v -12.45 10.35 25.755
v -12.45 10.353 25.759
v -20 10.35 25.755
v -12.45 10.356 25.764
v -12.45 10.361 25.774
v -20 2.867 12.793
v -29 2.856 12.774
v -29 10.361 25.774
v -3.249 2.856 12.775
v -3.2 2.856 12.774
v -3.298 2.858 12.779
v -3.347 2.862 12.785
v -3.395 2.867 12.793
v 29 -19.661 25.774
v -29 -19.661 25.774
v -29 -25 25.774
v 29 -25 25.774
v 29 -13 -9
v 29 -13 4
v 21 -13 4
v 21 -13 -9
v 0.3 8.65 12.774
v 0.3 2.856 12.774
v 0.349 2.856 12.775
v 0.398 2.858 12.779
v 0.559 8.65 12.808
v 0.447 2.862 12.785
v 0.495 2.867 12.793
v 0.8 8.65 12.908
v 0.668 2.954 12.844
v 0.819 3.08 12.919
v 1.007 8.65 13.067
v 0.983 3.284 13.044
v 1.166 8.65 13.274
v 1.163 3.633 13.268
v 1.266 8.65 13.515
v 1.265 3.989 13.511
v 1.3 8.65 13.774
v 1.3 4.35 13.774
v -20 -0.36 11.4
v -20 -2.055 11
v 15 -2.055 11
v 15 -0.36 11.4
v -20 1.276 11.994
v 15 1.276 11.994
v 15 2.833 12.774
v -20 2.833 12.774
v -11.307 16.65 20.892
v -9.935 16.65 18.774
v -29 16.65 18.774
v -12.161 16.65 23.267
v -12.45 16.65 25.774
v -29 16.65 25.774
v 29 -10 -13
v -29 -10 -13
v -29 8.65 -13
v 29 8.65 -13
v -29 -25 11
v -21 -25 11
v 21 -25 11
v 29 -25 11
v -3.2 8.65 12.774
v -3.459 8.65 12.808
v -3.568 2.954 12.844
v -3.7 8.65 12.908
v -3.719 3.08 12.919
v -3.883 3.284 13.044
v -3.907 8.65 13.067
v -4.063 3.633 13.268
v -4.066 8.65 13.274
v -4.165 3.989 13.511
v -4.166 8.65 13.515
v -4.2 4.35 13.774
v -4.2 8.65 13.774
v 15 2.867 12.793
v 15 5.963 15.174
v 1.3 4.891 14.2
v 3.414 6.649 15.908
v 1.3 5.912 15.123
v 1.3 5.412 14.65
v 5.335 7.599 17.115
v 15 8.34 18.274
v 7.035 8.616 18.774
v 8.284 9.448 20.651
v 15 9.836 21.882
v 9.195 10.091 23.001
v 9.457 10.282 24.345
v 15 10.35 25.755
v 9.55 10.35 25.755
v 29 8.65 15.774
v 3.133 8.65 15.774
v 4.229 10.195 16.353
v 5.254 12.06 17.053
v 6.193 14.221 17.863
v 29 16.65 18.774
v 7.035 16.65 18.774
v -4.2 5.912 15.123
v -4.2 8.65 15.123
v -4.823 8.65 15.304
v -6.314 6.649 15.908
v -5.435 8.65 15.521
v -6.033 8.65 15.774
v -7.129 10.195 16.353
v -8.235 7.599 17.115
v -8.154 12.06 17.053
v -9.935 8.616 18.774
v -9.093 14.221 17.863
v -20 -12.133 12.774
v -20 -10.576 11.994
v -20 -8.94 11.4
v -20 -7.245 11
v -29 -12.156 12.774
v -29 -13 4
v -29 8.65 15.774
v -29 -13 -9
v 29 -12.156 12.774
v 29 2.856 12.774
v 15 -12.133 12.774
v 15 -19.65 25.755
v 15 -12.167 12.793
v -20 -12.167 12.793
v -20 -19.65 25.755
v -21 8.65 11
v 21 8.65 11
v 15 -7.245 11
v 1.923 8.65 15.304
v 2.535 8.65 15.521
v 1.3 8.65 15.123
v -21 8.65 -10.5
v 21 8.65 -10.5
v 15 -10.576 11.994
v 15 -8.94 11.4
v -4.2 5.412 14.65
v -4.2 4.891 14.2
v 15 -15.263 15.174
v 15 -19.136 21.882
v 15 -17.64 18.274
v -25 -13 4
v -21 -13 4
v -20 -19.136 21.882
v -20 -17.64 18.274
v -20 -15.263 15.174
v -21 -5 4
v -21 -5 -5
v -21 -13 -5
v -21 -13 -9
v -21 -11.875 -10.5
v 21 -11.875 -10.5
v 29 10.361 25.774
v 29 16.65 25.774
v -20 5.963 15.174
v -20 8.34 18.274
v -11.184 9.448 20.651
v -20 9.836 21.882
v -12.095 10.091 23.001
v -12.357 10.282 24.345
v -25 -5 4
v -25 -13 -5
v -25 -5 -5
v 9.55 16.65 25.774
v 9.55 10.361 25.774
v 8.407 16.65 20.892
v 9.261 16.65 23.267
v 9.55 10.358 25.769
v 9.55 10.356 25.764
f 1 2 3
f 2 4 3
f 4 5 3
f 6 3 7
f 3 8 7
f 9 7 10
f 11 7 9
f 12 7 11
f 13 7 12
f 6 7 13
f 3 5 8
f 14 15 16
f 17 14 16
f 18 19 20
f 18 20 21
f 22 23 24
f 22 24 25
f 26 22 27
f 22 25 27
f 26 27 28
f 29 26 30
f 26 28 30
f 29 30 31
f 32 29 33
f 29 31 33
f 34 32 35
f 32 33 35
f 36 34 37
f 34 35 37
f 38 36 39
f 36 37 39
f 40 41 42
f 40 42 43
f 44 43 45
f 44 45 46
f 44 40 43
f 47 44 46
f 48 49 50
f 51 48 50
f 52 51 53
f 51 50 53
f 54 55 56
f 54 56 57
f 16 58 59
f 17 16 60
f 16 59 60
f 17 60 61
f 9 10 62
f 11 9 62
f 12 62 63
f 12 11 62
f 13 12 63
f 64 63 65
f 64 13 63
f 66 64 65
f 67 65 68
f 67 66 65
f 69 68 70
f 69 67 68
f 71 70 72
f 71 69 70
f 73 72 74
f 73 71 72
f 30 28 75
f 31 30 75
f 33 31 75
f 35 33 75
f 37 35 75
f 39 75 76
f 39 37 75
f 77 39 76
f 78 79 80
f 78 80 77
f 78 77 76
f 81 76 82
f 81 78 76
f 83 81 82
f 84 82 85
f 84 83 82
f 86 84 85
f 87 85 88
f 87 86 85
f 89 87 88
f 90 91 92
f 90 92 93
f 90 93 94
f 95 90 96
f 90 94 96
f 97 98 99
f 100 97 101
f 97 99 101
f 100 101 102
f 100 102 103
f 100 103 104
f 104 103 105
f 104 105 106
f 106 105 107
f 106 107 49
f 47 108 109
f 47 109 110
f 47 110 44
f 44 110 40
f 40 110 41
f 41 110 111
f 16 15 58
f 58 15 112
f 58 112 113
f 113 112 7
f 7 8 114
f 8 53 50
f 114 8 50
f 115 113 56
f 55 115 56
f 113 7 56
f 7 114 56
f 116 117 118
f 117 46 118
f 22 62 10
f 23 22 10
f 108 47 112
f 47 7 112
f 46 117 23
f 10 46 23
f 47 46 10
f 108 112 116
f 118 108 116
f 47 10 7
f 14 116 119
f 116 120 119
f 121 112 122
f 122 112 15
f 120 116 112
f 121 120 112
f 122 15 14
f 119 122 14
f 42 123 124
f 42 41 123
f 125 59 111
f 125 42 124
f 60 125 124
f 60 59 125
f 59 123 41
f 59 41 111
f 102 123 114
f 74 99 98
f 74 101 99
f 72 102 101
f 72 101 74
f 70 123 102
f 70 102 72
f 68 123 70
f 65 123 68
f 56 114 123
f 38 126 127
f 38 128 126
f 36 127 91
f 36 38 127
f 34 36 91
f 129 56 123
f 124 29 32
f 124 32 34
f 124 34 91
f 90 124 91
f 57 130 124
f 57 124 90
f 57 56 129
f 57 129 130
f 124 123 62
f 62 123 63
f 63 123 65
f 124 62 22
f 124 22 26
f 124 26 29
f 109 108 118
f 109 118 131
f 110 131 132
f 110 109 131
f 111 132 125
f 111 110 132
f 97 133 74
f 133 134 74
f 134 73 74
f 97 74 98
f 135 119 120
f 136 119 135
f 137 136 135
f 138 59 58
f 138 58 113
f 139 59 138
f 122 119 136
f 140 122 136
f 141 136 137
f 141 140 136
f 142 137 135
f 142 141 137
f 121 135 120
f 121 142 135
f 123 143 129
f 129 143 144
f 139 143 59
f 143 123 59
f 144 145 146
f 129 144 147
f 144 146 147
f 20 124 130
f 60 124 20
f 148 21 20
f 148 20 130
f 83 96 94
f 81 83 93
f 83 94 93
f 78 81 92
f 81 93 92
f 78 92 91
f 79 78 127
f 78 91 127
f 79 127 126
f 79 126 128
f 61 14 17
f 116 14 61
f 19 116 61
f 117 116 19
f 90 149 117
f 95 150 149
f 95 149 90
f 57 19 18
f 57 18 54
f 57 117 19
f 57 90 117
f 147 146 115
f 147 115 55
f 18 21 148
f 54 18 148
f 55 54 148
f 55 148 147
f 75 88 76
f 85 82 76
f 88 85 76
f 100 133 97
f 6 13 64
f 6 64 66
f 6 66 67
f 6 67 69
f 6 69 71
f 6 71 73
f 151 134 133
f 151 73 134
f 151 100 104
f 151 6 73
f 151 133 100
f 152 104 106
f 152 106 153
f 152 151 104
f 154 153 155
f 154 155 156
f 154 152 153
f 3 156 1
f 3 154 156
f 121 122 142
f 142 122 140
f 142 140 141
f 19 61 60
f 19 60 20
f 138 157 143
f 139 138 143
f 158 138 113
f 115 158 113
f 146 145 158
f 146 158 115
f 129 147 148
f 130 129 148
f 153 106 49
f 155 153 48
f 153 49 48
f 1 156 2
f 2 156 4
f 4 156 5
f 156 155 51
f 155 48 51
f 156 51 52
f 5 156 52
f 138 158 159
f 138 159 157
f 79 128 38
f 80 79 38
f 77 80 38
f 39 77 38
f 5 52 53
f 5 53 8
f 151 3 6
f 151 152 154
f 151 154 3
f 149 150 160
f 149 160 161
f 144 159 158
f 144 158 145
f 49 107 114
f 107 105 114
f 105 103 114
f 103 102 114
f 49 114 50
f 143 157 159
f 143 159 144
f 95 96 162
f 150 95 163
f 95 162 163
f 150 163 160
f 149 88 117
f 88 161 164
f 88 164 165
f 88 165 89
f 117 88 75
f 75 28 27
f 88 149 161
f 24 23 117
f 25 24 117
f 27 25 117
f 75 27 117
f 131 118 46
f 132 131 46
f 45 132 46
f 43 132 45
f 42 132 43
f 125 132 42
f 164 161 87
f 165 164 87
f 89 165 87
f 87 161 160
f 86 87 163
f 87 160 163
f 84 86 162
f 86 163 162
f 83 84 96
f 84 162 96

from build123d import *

# Parameters (mm, degrees)
SKETCH1_W               = 58
SKETCH1_H               = 38.77382393
SKETCH1_W_2             = 42
SKETCH1_H_2             = 21.5
BOSS_EXTRUDE2_DEPTH     = 33.65
CUT_EXTRUDE3_DEPTH      = 69.21502767
SKETCH7_W               = 4
SKETCH7_H               = 9
CUT_EXTRUDE4_DEPTH      = 8
BOSS_EXTRUDE3_DEPTH     = 58
CUT_EXTRUDE5_DEPTH      = 69.21502767
SKETCH10_W              = 5.5
SKETCH10_H              = 7
CUT_EXTRUDE6_DEPTH      = 15
FILLET1_R               = 1
CUT_EXTRUDE7_DEPTH      = 15
CUT_EXTRUDE7_DEPTH_BACK = 20
SKETCH11_R              = 15


with BuildPart() as part:
    # Sketch1 → Boss-Extrude2 (new body)
    with BuildSketch(Plane(origin=(0, -25, 0), x_dir=(1, 0, 0), z_dir=(0, 1, 0))):
        with Locations((0, -6.386911965)):
            Rectangle(SKETCH1_W, SKETCH1_H)
        with Locations((0, -0.25)):
            Rectangle(SKETCH1_W_2, SKETCH1_H_2, mode=Mode.SUBTRACT)
    extrude(amount=BOSS_EXTRUDE2_DEPTH)

    # Sketch6 → Cut-Extrude3 (cut, through all)
    with BuildSketch(Plane(origin=(29, 0, 0), x_dir=(0, 0, -1), z_dir=(1, 0, 0))):
        Polygon((-11, -25), (-4, -13), (9, -13), (13, -10), (13, -25), align=None)
    extrude(amount=-CUT_EXTRUDE3_DEPTH, mode=Mode.SUBTRACT)

    # Sketch7 → Cut-Extrude4 (cut)
    with BuildSketch(Plane.XZ.offset(13)):
        with Locations((-23, -0.5)):
            Rectangle(SKETCH7_W, SKETCH7_H)
    extrude(amount=-CUT_EXTRUDE4_DEPTH, mode=Mode.SUBTRACT)

    # Sketch9 → Boss-Extrude3 (add)
    with BuildSketch(Plane.ZY.offset(29)):
        Polygon((15.77382393, 8.65), (18.77382393, 16.65), (25.77382393, 16.65), (25.77382393, 8.65), align=None)
    extrude(amount=-BOSS_EXTRUDE3_DEPTH)

    # Sketch8 → Cut-Extrude5 (cut, through all)
    with BuildSketch(Plane.ZY.offset(29)):
        Polygon((25.77382393, 10.361106999), (12.77382393, 2.855553499), (12.77382393, -12.155553499), (25.77382393, -19.661106999), (38.77382393, -12.155553499), (38.77382393, 2.855553499), align=None)
    extrude(amount=-CUT_EXTRUDE5_DEPTH, mode=Mode.SUBTRACT)

    # Sketch10 → Cut-Extrude6 (cut)
    with BuildSketch(Plane(origin=(0, 16.65, 0), x_dir=(1, 0, 0), z_dir=(0, 1, 0))):
        with BuildLine():
            Line((-4.2, -12.77382393), (-4.2, -15.123119728))
            ThreePointArc((-4.2, -15.123119728), (-1.45, -14.77382393), (1.3, -15.123119728))
            Line((1.3, -15.123119728), (1.3, -12.77382393))
            Line((1.3, -12.77382393), (-4.2, -12.77382393))
        make_face()
        with BuildLine():
            Line((1.3, -18.77382393), (1.3, -25.77382393))
            Line((1.3, -25.77382393), (9.55, -25.77382393))
            ThreePointArc((9.55, -25.77382393), (8.90224843, -22.054825081), (7.035281374, -18.77382393))
            Line((7.035281374, -18.77382393), (1.3, -18.77382393))
        make_face()
        with BuildLine():
            Line((1.3, -15.123119728), (1.3, -18.77382393))
            Line((1.3, -18.77382393), (7.035281374, -18.77382393))
            ThreePointArc((7.035281374, -18.77382393), (4.456758602, -16.4942656), (1.3, -15.123119728))
        make_face()
        with BuildLine():
            Line((-4.2, -15.123119728), (-4.2, -18.77382393))
            Line((-4.2, -18.77382393), (1.3, -18.77382393))
            Line((1.3, -18.77382393), (1.3, -15.123119728))
            ThreePointArc((1.3, -15.123119728), (-1.45, -14.77382393), (-4.2, -15.123119728))
        make_face()
        with BuildLine():
            Line((-12.45, -25.77382393), (-4.2, -25.77382393))
            Line((-4.2, -25.77382393), (-4.2, -18.77382393))
            Line((-4.2, -18.77382393), (-9.935281374, -18.77382393))
            ThreePointArc((-9.935281374, -18.77382393), (-11.80224843, -22.054825081), (-12.45, -25.77382393))
        make_face()
        with Locations((-1.45, -22.27382393)):
            Rectangle(SKETCH10_W, SKETCH10_H)
        with BuildLine():
            Line((-9.935281374, -18.77382393), (-4.2, -18.77382393))
            Line((-4.2, -18.77382393), (-4.2, -15.123119728))
            ThreePointArc((-4.2, -15.123119728), (-7.356758602, -16.4942656), (-9.935281374, -18.77382393))
        make_face()
    extrude(amount=-CUT_EXTRUDE6_DEPTH, mode=Mode.SUBTRACT)

    # Fillet1
    fillet1_edges = [part.edges().sort_by_distance(p)[0] for p in [
        (-4.2, 5.75277675, 12.77382393),
        (1.3, 5.75277675, 12.77382393),
    ]]
    fillet(fillet1_edges, radius=FILLET1_R)

    # Sketch11 → Cut-Extrude7 (cut, two sides: drawn at the far end of the back side and taken through both)
    with BuildSketch(Plane(origin=(0, 0, 0), x_dir=(0, 0, -1), z_dir=(1, 0, 0)).offset(-CUT_EXTRUDE7_DEPTH_BACK)):
        with Locations((-25.77382393, -4.65)):
            Circle(SKETCH11_R)
    extrude(amount=CUT_EXTRUDE7_DEPTH + CUT_EXTRUDE7_DEPTH_BACK, mode=Mode.SUBTRACT)


solid = part.part
